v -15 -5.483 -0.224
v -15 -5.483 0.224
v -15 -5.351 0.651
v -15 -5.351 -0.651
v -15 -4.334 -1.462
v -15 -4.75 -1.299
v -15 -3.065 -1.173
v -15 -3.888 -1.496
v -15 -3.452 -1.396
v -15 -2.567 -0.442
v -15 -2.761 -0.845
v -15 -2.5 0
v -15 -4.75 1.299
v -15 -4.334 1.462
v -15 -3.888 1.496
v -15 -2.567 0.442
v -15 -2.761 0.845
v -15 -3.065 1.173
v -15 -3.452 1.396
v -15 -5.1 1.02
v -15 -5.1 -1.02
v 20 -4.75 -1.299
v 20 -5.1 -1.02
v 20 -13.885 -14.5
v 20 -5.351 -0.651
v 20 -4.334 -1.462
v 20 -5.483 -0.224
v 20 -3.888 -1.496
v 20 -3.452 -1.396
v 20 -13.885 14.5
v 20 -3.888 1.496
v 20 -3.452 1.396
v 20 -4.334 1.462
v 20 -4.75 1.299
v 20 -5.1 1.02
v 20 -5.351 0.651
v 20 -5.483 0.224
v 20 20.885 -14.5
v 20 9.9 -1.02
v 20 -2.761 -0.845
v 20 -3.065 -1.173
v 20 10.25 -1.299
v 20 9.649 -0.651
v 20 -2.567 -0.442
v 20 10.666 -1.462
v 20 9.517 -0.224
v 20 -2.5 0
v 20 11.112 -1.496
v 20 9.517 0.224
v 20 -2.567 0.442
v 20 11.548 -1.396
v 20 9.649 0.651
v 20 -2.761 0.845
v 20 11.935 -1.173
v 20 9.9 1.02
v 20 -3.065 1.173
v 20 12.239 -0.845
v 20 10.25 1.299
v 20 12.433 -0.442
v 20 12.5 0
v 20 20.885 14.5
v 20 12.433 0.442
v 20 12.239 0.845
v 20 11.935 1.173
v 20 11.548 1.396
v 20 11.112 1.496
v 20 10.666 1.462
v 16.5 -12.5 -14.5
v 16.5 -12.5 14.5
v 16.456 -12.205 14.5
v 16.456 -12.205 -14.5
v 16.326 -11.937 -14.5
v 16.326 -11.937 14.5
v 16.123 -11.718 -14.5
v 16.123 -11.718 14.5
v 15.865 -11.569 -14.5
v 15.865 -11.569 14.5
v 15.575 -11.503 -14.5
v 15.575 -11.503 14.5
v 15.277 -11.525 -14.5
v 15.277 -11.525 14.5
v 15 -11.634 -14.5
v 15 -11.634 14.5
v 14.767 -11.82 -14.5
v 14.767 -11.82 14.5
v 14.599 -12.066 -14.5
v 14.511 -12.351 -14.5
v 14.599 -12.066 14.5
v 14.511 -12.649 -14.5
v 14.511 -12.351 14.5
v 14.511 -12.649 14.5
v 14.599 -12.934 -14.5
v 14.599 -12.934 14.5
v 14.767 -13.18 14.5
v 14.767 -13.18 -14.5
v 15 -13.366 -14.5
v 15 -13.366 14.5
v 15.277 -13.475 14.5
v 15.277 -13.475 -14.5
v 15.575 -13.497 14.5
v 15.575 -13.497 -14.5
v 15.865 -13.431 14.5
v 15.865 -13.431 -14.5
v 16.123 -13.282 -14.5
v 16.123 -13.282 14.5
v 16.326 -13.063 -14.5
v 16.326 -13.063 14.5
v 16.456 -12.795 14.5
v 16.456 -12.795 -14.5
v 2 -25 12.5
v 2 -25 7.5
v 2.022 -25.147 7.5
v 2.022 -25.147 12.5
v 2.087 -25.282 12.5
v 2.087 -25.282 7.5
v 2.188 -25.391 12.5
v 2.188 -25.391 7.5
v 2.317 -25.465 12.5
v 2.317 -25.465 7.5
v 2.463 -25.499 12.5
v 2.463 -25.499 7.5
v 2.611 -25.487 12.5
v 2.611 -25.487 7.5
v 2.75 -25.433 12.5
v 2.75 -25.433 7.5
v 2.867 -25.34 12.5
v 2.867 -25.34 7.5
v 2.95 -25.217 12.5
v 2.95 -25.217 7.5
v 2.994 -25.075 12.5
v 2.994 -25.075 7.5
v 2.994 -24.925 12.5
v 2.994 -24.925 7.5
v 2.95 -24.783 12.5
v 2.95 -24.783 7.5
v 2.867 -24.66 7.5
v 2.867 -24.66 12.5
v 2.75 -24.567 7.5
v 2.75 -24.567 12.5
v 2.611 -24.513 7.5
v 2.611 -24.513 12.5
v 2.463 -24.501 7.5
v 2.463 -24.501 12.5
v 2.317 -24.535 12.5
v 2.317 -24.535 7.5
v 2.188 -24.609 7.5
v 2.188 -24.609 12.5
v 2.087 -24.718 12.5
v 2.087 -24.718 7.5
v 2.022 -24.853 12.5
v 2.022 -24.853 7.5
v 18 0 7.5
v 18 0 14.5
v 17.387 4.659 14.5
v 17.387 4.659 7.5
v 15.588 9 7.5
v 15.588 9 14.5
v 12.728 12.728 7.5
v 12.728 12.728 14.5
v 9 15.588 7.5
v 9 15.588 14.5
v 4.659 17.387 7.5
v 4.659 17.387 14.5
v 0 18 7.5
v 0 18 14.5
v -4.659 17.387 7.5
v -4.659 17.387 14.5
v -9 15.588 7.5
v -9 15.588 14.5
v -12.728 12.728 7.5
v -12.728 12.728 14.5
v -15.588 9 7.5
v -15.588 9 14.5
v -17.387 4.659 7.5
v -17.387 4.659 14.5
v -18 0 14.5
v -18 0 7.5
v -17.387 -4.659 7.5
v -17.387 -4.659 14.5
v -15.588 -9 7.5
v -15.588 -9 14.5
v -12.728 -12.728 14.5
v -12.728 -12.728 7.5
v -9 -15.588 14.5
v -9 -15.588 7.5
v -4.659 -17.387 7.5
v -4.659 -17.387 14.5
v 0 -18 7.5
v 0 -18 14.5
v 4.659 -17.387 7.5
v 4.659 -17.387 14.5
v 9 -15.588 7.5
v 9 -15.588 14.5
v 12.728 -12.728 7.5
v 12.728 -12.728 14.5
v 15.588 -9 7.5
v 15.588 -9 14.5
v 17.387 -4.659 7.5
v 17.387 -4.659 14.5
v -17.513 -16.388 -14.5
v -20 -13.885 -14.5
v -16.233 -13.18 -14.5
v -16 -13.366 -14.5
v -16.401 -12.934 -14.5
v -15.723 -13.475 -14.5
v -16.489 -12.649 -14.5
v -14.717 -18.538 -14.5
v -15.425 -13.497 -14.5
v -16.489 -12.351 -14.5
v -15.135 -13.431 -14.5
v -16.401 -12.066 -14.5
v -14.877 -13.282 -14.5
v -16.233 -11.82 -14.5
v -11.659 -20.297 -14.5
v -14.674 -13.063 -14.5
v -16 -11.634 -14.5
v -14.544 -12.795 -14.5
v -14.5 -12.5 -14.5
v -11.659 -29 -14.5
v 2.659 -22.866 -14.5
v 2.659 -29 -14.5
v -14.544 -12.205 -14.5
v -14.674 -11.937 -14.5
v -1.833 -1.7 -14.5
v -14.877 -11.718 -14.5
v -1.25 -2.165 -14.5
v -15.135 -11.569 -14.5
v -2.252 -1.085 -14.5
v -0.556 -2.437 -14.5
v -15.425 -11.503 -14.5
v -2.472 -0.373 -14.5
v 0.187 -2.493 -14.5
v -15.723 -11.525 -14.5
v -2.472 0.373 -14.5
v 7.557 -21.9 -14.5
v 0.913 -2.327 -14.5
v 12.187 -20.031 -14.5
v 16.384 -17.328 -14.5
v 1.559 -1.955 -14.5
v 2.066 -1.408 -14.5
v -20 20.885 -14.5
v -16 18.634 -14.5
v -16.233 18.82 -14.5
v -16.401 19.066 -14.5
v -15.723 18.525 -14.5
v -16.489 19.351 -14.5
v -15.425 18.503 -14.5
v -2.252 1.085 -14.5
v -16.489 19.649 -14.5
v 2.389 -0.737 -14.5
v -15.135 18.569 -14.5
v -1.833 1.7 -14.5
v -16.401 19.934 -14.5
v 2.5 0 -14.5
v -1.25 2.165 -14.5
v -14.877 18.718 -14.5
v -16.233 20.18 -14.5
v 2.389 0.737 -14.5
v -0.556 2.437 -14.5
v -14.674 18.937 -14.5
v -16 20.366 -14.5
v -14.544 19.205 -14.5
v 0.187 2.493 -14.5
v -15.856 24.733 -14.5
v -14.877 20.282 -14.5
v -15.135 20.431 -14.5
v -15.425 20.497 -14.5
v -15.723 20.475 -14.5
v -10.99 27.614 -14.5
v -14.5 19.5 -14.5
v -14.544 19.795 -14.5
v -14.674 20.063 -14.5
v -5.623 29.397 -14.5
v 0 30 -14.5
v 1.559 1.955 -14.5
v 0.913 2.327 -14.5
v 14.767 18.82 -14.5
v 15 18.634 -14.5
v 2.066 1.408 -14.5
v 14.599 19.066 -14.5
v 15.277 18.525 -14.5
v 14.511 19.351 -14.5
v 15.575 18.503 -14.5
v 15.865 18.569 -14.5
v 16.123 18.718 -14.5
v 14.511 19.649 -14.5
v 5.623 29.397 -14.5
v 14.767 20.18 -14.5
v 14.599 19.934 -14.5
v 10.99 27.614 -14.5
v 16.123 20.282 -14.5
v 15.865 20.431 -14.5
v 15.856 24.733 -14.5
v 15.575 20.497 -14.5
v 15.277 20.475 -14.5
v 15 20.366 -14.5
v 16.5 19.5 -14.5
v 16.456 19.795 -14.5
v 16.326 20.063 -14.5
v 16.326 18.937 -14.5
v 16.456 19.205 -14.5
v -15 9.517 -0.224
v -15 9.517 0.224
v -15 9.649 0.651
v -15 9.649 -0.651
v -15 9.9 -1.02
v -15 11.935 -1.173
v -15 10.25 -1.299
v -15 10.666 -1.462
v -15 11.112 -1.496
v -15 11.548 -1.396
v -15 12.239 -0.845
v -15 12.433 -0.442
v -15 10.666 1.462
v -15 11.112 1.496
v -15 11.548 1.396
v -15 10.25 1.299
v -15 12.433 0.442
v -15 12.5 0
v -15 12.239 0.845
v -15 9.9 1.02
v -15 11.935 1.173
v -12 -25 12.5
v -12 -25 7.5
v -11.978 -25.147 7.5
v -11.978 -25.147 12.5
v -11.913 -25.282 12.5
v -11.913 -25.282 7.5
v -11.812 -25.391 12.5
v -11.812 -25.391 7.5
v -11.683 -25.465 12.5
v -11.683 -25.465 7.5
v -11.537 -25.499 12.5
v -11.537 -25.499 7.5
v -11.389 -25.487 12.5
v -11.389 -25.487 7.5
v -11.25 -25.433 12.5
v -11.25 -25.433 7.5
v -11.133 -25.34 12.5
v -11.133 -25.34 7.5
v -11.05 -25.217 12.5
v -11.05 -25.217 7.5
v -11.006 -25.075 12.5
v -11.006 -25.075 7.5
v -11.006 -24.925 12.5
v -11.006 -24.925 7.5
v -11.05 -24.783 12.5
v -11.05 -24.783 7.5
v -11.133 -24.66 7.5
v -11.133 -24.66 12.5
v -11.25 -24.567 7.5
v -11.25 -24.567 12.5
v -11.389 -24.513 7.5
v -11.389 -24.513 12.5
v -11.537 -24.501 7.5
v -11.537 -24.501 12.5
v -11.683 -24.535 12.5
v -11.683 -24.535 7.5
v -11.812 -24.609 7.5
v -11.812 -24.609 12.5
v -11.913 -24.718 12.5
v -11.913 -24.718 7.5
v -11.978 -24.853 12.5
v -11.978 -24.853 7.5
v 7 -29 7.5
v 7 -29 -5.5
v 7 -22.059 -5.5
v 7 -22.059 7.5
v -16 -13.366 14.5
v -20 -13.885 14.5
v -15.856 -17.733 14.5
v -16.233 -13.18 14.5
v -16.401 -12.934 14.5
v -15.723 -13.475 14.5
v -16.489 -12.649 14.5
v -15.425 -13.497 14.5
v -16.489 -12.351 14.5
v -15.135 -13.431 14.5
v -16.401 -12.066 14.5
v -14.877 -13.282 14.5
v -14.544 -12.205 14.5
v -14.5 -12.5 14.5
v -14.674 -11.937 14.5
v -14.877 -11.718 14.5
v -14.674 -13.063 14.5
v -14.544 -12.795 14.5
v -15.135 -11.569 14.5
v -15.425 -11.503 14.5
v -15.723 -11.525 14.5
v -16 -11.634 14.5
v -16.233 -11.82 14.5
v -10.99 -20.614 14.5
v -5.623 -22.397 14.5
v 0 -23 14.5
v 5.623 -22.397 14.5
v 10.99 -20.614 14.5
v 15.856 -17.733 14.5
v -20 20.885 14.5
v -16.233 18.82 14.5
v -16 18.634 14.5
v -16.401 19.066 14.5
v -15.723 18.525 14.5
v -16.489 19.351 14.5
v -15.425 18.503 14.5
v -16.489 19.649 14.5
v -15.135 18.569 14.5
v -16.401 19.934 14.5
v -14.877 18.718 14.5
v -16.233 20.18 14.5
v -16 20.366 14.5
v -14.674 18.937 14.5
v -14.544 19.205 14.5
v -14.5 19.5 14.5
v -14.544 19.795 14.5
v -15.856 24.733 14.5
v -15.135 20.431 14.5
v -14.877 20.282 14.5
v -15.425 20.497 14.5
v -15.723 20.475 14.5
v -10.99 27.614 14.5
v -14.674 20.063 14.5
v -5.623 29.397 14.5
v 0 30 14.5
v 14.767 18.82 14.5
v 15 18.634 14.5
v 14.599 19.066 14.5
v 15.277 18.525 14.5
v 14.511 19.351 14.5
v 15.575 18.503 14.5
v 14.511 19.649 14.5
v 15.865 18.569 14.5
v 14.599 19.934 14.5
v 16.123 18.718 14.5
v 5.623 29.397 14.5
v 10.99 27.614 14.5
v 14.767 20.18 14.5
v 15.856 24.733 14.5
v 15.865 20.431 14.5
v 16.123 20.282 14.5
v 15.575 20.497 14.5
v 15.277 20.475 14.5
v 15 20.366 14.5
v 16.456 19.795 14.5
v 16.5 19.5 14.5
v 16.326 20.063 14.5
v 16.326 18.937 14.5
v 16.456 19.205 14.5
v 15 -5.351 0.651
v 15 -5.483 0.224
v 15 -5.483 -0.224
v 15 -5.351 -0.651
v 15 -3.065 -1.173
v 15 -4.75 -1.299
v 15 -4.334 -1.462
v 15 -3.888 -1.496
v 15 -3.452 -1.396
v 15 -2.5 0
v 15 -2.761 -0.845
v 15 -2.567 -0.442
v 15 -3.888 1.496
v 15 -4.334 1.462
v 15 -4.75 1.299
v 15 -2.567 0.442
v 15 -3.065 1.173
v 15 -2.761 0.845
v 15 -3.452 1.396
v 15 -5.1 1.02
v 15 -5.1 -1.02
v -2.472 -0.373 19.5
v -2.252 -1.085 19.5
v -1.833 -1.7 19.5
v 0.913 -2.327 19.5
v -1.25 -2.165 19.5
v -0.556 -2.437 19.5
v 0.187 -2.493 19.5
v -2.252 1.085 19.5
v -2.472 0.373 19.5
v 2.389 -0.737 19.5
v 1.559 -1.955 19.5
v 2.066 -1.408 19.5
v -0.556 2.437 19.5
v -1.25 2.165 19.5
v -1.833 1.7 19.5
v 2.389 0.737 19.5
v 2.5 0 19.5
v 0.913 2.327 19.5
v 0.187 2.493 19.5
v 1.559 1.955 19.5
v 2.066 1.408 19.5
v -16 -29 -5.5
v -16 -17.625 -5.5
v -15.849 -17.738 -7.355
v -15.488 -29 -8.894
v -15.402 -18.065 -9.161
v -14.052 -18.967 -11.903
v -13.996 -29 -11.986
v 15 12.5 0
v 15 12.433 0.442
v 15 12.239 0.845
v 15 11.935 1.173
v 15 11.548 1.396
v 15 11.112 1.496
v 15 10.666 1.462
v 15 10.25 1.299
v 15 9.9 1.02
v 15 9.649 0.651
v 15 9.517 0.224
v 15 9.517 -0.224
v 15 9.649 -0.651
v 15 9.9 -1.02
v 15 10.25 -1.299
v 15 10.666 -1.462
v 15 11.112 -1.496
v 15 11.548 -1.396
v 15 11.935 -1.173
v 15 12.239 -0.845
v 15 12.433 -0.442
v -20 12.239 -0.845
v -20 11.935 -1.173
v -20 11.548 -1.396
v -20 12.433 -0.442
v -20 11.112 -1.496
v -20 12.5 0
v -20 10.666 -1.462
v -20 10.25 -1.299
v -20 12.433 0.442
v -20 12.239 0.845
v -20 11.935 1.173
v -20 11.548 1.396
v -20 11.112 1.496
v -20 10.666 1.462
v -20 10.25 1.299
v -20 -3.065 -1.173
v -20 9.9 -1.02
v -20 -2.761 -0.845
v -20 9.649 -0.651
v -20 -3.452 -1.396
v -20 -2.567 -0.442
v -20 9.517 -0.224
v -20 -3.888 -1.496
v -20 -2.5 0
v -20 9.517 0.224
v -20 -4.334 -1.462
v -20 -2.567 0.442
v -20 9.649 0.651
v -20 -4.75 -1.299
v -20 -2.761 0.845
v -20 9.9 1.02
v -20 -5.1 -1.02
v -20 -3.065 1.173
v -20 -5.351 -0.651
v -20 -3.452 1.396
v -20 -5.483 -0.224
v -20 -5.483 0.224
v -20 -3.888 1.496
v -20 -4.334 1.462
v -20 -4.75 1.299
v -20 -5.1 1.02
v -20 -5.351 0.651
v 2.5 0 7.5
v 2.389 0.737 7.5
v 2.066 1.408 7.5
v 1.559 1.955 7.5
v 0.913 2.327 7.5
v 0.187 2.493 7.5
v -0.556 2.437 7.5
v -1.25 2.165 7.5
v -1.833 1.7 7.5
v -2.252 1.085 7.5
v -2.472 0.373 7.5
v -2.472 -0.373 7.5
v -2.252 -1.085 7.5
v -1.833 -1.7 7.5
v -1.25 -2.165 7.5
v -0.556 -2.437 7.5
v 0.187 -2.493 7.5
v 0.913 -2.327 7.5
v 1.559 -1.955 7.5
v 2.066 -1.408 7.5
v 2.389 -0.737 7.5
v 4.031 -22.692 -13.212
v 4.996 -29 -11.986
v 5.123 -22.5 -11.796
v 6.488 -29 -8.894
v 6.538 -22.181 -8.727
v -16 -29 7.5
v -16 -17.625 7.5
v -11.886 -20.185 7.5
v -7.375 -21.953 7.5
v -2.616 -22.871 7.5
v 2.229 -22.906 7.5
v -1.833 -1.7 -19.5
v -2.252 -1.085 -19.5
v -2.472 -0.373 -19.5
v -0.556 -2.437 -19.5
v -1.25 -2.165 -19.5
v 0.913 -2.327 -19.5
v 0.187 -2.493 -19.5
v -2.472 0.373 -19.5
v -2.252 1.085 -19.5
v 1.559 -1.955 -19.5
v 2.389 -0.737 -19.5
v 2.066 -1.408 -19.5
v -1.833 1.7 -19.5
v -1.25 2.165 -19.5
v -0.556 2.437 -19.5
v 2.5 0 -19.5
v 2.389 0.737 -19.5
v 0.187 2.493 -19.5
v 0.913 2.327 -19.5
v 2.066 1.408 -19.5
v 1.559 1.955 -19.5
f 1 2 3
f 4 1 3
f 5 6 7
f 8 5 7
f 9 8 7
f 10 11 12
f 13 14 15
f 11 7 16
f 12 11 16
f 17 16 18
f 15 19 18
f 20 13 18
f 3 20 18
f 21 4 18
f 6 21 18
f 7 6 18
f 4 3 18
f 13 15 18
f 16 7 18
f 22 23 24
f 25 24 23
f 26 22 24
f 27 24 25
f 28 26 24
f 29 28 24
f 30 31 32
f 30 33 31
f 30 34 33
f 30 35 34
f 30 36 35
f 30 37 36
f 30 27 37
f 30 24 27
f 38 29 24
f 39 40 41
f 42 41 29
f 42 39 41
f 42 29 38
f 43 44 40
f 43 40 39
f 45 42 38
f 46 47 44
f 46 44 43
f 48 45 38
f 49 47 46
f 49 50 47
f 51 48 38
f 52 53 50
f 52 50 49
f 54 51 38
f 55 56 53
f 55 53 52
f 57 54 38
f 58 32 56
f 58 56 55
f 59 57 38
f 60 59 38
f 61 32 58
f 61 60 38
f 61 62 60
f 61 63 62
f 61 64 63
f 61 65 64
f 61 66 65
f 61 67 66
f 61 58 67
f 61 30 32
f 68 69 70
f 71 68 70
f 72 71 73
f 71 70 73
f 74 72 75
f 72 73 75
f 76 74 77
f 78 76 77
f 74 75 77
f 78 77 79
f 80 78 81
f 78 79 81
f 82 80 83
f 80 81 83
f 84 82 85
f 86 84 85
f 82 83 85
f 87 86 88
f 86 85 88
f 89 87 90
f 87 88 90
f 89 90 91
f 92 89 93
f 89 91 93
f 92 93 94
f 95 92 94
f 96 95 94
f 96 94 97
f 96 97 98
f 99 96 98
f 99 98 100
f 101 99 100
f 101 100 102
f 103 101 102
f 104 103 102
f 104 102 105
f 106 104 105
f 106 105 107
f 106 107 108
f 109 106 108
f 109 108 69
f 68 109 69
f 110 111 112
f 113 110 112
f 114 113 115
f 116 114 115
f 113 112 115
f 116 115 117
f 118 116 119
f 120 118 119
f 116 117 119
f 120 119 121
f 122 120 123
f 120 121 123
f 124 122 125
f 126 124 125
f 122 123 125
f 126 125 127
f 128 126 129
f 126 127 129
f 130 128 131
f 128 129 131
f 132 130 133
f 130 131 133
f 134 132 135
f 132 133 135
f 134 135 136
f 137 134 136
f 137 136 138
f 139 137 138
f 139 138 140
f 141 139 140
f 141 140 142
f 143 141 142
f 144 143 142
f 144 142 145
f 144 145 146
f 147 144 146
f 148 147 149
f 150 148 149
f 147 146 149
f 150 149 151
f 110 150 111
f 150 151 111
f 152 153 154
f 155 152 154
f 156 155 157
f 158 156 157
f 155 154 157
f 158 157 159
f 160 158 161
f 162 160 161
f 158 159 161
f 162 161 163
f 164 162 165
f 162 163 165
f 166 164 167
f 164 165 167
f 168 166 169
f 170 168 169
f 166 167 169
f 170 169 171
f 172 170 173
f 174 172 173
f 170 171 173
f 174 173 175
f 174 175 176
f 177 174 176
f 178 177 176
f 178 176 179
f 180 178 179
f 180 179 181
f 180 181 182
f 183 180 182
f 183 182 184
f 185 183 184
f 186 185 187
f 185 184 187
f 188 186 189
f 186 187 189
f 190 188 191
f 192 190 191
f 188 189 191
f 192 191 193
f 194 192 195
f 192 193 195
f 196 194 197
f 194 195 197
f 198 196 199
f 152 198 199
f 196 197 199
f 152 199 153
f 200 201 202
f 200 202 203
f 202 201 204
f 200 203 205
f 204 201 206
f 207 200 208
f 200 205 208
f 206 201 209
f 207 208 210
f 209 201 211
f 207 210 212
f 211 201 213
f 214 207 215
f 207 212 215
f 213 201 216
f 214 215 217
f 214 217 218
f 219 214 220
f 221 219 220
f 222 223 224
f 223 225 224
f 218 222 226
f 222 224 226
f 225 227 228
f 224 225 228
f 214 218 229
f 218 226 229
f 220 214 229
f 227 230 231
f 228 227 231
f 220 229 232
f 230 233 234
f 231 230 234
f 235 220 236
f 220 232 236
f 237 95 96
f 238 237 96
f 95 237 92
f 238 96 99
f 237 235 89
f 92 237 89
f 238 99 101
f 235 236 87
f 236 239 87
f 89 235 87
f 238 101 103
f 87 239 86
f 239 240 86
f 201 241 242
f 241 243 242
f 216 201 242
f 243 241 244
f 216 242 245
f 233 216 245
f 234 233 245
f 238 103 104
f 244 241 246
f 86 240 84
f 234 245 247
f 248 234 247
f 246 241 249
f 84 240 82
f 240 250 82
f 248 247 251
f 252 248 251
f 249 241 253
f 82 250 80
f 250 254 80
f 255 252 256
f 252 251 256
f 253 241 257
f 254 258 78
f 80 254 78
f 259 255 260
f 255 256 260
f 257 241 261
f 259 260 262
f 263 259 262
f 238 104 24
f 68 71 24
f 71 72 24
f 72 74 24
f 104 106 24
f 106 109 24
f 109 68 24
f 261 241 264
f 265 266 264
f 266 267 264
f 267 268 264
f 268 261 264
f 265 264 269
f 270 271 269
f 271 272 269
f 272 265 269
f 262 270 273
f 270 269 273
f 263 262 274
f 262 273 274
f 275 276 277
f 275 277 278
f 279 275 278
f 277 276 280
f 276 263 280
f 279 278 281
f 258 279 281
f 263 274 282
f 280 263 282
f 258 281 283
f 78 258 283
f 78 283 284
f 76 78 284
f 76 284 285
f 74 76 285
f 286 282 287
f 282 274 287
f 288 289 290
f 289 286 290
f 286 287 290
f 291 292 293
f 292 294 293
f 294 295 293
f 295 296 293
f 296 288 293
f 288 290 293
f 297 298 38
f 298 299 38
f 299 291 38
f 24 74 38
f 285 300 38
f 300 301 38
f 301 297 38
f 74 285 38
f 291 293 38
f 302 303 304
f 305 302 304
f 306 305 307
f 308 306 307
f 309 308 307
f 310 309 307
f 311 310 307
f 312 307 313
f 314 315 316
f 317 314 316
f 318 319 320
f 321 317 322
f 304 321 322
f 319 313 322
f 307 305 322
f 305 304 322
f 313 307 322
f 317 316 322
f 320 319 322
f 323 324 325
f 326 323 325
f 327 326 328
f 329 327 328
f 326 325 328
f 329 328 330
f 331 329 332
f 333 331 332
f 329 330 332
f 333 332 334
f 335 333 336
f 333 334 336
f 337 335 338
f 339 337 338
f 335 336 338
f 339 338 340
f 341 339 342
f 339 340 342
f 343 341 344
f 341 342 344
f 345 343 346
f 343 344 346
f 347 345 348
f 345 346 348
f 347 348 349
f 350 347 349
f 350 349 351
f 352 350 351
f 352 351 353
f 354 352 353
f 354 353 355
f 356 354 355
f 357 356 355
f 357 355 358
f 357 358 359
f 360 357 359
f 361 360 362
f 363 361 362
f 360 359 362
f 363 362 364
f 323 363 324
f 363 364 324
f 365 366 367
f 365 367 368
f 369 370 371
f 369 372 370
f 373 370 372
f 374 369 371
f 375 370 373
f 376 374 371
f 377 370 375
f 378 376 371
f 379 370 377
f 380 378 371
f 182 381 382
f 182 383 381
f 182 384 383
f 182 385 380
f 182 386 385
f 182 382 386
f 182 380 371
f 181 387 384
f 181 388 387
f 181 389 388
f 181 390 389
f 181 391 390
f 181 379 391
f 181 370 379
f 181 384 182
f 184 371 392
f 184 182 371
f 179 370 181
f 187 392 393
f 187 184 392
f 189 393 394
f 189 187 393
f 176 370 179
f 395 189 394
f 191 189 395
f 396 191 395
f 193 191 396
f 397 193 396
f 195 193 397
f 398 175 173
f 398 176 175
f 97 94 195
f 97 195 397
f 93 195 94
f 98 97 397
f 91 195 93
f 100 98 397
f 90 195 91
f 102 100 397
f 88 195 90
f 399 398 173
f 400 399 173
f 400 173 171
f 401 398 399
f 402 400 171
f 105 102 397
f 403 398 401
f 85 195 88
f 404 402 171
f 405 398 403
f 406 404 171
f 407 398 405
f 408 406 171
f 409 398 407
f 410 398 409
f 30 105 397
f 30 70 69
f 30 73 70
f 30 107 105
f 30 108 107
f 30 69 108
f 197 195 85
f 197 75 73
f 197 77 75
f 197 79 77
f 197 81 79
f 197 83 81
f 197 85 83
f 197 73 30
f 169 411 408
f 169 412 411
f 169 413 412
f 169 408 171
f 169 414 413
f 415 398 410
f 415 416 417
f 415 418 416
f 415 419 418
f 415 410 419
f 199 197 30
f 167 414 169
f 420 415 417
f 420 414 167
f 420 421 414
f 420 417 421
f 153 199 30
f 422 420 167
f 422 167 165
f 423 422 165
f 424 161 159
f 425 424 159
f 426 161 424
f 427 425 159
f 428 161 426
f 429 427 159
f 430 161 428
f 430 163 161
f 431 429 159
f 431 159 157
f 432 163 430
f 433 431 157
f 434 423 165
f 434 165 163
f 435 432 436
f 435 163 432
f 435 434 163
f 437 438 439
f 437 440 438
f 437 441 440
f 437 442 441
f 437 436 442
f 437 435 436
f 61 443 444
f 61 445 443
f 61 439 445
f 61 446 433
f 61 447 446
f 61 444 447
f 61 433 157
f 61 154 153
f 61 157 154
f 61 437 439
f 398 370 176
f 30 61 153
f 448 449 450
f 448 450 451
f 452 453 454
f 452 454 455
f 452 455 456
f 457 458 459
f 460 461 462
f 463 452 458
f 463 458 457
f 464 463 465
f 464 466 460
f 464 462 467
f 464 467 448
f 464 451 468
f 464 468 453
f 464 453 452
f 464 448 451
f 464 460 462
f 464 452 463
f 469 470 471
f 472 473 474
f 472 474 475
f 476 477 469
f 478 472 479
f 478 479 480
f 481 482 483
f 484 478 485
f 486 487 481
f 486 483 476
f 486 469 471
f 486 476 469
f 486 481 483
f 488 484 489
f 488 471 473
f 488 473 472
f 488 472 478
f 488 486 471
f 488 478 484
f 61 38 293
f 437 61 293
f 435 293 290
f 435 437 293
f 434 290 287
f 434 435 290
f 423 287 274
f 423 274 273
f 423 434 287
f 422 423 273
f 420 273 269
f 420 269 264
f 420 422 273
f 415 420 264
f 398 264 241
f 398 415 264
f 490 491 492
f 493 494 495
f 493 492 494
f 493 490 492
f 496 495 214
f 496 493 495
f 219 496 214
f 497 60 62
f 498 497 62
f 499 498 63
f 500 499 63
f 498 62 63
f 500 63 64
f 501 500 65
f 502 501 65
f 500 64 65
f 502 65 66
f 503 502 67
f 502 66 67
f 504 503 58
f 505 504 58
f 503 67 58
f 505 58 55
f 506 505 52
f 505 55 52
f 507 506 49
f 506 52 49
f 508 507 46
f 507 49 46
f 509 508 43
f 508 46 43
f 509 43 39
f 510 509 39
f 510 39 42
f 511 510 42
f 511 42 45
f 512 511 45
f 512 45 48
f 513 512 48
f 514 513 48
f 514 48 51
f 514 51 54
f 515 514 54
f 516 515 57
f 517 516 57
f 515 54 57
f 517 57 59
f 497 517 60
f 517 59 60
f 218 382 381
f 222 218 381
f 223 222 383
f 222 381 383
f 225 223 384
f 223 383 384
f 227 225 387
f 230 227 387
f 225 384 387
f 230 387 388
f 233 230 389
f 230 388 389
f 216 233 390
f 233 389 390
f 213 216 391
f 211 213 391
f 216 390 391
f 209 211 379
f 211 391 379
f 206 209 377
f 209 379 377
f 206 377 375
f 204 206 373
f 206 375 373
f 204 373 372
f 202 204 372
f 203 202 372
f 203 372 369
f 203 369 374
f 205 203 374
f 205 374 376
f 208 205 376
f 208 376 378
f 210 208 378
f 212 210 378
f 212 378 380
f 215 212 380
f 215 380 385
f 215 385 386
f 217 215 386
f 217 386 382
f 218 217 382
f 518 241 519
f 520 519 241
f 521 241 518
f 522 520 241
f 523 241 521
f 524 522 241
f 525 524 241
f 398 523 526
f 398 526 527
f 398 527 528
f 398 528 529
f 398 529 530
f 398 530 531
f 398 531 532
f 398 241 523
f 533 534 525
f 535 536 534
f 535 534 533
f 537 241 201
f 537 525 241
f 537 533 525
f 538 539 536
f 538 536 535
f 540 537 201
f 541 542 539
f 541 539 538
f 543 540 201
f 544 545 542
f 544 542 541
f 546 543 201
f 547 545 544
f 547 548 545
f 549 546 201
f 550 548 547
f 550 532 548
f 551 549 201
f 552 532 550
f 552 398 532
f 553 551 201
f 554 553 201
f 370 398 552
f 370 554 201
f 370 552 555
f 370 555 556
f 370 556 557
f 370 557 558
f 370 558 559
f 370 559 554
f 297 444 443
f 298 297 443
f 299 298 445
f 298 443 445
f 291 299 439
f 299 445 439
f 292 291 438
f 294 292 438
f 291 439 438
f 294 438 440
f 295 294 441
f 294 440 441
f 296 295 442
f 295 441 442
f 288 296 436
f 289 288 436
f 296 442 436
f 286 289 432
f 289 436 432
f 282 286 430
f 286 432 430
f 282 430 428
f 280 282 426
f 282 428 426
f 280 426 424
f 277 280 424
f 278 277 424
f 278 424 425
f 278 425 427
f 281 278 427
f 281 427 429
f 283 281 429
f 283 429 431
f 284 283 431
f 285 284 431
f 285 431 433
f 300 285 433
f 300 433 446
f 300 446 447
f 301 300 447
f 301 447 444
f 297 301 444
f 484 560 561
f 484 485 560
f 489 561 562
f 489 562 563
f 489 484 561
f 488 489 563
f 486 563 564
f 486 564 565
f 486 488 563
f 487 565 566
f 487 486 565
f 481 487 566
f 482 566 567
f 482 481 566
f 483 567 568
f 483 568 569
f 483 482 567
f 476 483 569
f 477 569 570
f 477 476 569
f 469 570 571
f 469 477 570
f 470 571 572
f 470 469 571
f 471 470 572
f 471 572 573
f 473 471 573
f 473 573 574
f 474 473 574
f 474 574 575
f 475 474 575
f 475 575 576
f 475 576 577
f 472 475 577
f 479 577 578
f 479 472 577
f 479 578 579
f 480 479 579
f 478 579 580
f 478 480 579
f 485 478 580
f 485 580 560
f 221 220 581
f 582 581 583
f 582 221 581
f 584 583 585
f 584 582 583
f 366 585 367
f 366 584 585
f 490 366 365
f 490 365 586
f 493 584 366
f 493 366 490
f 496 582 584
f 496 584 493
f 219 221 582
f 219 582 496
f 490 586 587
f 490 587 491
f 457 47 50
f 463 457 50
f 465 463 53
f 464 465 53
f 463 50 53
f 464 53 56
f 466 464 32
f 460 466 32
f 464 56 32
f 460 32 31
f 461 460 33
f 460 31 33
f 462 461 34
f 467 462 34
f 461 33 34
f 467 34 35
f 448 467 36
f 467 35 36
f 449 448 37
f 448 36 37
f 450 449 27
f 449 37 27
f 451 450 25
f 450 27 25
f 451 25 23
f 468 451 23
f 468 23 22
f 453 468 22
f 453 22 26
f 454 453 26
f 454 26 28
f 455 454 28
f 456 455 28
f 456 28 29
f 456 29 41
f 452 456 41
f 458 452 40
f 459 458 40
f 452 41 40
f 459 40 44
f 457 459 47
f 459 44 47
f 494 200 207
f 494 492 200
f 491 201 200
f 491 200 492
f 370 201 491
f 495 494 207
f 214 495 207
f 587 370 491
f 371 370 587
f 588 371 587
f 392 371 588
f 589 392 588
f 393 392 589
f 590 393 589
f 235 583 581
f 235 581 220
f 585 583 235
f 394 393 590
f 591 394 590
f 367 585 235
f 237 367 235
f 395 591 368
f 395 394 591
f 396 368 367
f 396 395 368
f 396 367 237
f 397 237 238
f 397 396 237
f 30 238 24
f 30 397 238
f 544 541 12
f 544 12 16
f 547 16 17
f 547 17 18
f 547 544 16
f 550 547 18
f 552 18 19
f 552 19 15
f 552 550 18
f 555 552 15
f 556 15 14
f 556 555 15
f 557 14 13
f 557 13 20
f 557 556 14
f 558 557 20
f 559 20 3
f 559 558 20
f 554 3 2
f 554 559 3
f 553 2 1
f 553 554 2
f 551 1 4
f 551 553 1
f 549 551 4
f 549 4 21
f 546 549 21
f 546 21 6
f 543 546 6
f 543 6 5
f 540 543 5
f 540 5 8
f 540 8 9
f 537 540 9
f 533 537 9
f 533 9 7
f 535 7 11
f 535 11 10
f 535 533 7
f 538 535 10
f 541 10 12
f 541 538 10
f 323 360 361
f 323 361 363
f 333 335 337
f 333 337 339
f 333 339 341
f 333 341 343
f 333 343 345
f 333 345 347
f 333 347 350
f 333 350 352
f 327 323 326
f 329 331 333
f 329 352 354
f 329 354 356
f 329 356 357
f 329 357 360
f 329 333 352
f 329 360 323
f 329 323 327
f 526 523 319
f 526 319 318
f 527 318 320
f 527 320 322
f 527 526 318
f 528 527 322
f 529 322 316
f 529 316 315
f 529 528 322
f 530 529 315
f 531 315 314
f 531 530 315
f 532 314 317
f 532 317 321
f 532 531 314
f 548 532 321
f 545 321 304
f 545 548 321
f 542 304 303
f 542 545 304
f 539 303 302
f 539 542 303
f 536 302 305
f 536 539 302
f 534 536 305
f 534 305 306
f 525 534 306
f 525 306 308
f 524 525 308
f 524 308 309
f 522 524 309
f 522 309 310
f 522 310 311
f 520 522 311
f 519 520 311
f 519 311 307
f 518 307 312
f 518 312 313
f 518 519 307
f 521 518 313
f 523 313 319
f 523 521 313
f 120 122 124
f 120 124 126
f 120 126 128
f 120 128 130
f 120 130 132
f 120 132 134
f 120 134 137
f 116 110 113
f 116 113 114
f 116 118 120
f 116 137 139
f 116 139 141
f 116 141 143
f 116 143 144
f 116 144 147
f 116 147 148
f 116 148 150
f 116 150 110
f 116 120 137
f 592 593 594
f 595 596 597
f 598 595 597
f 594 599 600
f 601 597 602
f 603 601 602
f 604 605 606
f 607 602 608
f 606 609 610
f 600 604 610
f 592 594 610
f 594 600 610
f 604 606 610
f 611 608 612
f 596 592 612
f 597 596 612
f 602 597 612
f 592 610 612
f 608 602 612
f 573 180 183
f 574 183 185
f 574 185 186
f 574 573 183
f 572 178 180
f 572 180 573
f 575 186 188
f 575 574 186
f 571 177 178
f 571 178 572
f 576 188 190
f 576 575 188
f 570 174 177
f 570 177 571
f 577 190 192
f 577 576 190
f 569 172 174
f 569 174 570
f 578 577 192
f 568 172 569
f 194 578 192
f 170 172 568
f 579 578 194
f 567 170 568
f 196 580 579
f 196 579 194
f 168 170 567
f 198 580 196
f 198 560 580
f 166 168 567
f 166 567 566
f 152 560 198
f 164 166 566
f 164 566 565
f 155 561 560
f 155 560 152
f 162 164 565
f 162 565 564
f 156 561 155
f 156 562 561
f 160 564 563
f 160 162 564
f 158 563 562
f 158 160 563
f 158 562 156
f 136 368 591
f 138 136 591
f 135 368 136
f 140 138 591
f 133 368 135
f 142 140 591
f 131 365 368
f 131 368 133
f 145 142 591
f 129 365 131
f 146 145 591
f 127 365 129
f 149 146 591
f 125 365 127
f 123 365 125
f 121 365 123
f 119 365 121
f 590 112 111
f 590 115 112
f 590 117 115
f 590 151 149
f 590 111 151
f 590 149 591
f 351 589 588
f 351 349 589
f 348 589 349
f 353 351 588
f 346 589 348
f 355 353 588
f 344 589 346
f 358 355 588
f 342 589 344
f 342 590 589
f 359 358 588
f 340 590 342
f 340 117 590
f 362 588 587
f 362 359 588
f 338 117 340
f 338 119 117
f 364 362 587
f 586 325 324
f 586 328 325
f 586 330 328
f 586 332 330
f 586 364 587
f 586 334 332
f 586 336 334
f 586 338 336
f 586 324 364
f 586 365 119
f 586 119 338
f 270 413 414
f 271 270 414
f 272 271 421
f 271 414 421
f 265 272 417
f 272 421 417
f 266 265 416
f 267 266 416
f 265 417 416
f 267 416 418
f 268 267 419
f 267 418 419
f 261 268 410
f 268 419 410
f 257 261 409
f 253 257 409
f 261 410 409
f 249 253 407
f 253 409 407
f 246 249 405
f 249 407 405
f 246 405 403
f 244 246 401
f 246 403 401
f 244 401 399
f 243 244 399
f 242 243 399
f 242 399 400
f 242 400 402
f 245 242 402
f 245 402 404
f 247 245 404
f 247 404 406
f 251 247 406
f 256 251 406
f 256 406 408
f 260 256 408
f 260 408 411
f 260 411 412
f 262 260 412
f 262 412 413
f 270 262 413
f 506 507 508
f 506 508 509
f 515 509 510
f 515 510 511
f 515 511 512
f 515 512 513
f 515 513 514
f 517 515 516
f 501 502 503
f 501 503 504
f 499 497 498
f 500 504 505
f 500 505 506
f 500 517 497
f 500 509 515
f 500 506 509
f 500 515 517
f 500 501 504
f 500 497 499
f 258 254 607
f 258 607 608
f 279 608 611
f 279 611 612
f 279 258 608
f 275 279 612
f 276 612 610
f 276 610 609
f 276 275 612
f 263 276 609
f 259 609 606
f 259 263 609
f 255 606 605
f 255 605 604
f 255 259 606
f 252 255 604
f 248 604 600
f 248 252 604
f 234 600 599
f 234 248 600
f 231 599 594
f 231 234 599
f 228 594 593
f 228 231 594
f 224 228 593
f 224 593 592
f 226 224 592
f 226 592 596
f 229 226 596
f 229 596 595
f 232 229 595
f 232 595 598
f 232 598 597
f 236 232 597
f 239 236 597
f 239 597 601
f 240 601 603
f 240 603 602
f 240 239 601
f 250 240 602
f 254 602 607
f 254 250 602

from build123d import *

# Parameters (mm, degrees)
BOSS_EXTRUDE1_DEPTH      = 14.5
BOSS_EXTRUDE2_REACH      = 65.963
BOSS_EXTRUDE2_END_RADIUS = 26.5
SKETCH4_R                = 0.5
BOSS_EXTRUDE3_DEPTH      = 5
SKETCH6_R                = 2.5
BOSS_EXTRUDE4_DEPTH      = 19.5
SKETCH7_R                = 18
SKETCH7_R_2              = 2.5
CUT_EXTRUDE1_DEPTH       = 7
SKETCH8_R                = 1
CUT_EXTRUDE2_DEPTH       = 50.558046814
SKETCH9_R                = 1.5
CUT_EXTRUDE3_DEPTH       = 5


with BuildPart() as part:
    # Sketch1 → Boss-Extrude1 (new, symmetric)
    with BuildSketch(Plane.XY):
        with BuildLine():
            Line((-20, 20.885338651), (-20, -13.885338651))
            ThreePointArc((-20, -13.885338651), (0, -23), (20, -13.885338651))
            Line((20, -13.885338651), (20, 20.885338651))
            ThreePointArc((20, 20.885338651), (0, 30), (-20, 20.885338651))
        make_face()
    extrude(amount=BOSS_EXTRUDE1_DEPTH, both=True)

    # Boss-Extrude2: up to this cylinder (the profile starts outside it)
    boss_extrude2_end = Plane(origin=(0, 3.5, -3.065471), z_dir=(0, 0, -1)) * Cylinder(BOSS_EXTRUDE2_END_RADIUS, 185.926, mode=Mode.PRIVATE)
    # Sketch3 → Boss-Extrude2 (add, up to the surface)
    with BuildSketch(Plane(origin=(0, -29, 0), x_dir=(1, 0, 0), z_dir=(0, 1, 0)), mode=Mode.PRIVATE) as boss_extrude2_sk1:
        with BuildLine():
            Line((-11.658910532, 14.5), (2.658910532, 14.5))
            ThreePointArc((2.658910532, 14.5), (5.85802759, 10.496124943), (7, 5.5))
            Line((7, 5.5), (7, -7.5))
            Line((7, -7.5), (-16, -7.5))
            Line((-16, -7.5), (-16, 5.5))
            ThreePointArc((-16, 5.5), (-14.85802759, 10.496124943), (-11.658910532, 14.5))
        make_face()
    boss_extrude2_tool1 = extrude(boss_extrude2_sk1.sketch, amount=BOSS_EXTRUDE2_REACH, mode=Mode.PRIVATE) - boss_extrude2_end
    add(boss_extrude2_tool1.solids().sort_by_distance((-4.5, -29, -3.065471))[0])

    # Sketch4 → Boss-Extrude3 (add)
    with BuildSketch(Plane.XY.offset(7.5)):
        with Locations(Location((-11.5, -25, 0), (0, 0, 180))):
            Circle(SKETCH4_R)
        with Locations(Location((2.5, -25, 0), (0, 0, 180))):
            Circle(SKETCH4_R)
    extrude(amount=BOSS_EXTRUDE3_DEPTH)

    # Sketch6 → Boss-Extrude4 (add, symmetric)
    with BuildSketch(Plane.XY):
        Circle(SKETCH6_R)
    extrude(amount=BOSS_EXTRUDE4_DEPTH, both=True)

    # Sketch7 → Cut-Extrude1 (cut)
    with BuildSketch(Plane.XY.offset(14.5)):
        Circle(SKETCH7_R)
        Circle(SKETCH7_R_2, mode=Mode.SUBTRACT)
    extrude(amount=-CUT_EXTRUDE1_DEPTH, mode=Mode.SUBTRACT)

    # Sketch8 → Cut-Extrude2 (cut, through all)
    with BuildSketch(Plane.XY.offset(14.5)):
        with Locations((-15.5, 19.5)):
            Circle(SKETCH8_R)
        with Locations((15.5, 19.5)):
            Circle(SKETCH8_R)
        with Locations((15.5, -12.5)):
            Circle(SKETCH8_R)
        with Locations((-15.5, -12.5)):
            Circle(SKETCH8_R)
    extrude(amount=-CUT_EXTRUDE2_DEPTH, mode=Mode.SUBTRACT)

    # Sketch9 → Cut-Extrude3 (cut)
    with BuildSketch(Plane(origin=(20, 0, 0), x_dir=(0, 0, -1), z_dir=(1, 0, 0))):
        with Locations(Location((0, 11, 0), (0, 0, 90))):
            Circle(SKETCH9_R)
        with Locations(Location((0, -4, 0), (0, 0, 90))):
            Circle(SKETCH9_R)
    cut_extrude3 = extrude(amount=-CUT_EXTRUDE3_DEPTH, mode=Mode.SUBTRACT)

    # Mirror1: Cut-Extrude3 across plane
    add(cut_extrude3.mirror(Plane(origin=(0, 0, 0), x_dir=(0, 0, 1), z_dir=(1, 0, 0))), mode=Mode.SUBTRACT)


solid = part.part
